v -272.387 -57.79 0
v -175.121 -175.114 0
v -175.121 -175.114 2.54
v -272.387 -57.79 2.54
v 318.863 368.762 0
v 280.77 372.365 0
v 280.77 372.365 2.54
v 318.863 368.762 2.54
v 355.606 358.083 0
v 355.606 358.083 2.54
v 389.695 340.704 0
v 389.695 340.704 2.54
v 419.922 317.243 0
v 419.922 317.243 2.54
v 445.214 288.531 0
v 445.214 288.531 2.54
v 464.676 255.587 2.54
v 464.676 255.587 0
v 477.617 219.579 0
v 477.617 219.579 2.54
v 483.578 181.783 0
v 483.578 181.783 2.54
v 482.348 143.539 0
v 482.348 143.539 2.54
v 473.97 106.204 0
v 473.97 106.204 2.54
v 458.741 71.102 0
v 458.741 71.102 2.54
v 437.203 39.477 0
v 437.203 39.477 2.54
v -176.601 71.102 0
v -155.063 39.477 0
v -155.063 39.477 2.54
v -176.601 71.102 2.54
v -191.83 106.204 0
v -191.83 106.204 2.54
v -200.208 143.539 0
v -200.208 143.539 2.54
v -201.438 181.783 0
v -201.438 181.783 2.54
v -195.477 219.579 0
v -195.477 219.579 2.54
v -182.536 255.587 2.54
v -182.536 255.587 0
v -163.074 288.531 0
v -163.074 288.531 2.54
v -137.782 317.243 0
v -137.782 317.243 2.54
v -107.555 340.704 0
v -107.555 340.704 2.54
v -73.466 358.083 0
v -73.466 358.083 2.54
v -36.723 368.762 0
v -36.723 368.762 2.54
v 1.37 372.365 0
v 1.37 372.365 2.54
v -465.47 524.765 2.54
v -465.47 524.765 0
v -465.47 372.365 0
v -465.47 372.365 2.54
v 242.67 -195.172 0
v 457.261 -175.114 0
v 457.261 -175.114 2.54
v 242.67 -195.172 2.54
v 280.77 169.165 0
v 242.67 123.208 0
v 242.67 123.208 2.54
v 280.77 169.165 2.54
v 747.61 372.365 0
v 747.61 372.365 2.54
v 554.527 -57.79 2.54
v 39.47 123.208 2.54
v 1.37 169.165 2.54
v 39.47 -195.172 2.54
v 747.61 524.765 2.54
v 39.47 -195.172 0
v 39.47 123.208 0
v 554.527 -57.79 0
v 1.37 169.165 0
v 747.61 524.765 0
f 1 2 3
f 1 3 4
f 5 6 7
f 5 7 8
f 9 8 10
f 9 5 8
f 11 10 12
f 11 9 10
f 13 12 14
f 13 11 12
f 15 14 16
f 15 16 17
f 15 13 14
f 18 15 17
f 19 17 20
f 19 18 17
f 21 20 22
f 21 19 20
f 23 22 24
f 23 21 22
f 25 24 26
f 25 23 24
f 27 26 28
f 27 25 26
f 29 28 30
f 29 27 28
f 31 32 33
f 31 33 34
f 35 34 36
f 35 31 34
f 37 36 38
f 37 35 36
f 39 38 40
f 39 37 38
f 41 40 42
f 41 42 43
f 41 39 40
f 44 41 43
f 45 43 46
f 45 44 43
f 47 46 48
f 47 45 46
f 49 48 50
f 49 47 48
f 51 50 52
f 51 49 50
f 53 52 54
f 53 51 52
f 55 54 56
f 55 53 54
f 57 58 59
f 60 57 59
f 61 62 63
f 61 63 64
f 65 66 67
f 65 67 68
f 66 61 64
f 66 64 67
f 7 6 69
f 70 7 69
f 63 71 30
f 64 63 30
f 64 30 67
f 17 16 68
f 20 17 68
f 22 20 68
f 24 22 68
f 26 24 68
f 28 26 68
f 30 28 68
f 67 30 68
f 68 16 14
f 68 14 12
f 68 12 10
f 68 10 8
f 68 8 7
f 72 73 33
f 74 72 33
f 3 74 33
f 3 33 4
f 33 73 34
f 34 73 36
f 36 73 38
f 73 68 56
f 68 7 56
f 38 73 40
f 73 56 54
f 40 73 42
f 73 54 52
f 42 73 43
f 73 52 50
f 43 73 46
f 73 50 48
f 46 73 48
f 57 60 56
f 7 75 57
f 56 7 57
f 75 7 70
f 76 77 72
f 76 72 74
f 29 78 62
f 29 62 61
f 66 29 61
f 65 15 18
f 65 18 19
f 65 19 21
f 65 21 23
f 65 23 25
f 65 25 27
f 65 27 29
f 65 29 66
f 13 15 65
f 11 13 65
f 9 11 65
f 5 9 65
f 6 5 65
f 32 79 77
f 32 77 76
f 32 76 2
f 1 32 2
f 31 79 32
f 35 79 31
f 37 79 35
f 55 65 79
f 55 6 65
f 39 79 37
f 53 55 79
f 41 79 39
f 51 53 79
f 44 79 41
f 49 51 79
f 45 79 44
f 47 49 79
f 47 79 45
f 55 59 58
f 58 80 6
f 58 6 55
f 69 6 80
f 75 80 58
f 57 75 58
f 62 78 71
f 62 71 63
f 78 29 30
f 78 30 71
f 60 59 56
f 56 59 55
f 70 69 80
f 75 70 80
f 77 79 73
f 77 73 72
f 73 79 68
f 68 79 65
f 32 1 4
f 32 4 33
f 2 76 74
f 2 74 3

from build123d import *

# Parameters (mm, degrees)
BOSS_EXTRUDE2_DEPTH = 2.54


with BuildPart() as part:
    # Sketch1 → Boss-Extrude2 (new body)
    with BuildSketch(Plane.XY):
        Polygon((280.770009641, 372.365015451), (280.770009641, 169.165015451), (242.670009641, 169.165015451), (39.470009641, 169.165015451), (1.370009641, 169.165015451), (1.370009641, 372.365015451), align=None)
        Polygon((280.770009641, 372.365015451), (747.609563641, 372.365015451), (747.609563641, 524.765015451), (280.770009641, 524.765015451), (-24.029990359, 524.765015451), (-465.469544359, 524.765015451), (-465.469544359, 372.365015451), (1.370009641, 372.365015451), align=None)
        with BuildLine():
            Line((1.370009641, 372.365015451), (1.370009641, 169.165015451))
            Line((1.370009641, 169.165015451), (39.470009641, 123.208075057))
            Line((39.470009641, 123.208075057), (39.470009641, -195.172287059))
            Line((39.470009641, -195.172287059), (-155.062591517, 39.476614679))
            ThreePointArc((-155.062591517, 39.476614679), (-182.536111841, 255.58711032), (1.370009641, 372.365015451))
        make_face()
        with BuildLine():
            ThreePointArc((280.770009641, 372.365015451), (464.676131123, 255.58711032), (437.202610799, 39.476614679))
            Line((437.202610799, 39.476614679), (242.670009641, -195.172287059))
            Line((242.670009641, -195.172287059), (242.670009641, 123.208075057))
            Line((242.670009641, 123.208075057), (280.770009641, 169.165015451))
            Line((280.770009641, 169.165015451), (280.770009641, 372.365015451))
        make_face()
        Polygon((554.527061668, -57.7896859), (457.260761089, -175.114136769), (242.670009641, -195.172287059), (437.202610799, 39.476614679), align=None)
        Polygon((-272.387042386, -57.7896859), (-155.062591517, 39.476614679), (39.470009641, -195.172287059), (-175.120741807, -175.114136769), align=None)
    extrude(amount=BOSS_EXTRUDE2_DEPTH)


solid = part.part
